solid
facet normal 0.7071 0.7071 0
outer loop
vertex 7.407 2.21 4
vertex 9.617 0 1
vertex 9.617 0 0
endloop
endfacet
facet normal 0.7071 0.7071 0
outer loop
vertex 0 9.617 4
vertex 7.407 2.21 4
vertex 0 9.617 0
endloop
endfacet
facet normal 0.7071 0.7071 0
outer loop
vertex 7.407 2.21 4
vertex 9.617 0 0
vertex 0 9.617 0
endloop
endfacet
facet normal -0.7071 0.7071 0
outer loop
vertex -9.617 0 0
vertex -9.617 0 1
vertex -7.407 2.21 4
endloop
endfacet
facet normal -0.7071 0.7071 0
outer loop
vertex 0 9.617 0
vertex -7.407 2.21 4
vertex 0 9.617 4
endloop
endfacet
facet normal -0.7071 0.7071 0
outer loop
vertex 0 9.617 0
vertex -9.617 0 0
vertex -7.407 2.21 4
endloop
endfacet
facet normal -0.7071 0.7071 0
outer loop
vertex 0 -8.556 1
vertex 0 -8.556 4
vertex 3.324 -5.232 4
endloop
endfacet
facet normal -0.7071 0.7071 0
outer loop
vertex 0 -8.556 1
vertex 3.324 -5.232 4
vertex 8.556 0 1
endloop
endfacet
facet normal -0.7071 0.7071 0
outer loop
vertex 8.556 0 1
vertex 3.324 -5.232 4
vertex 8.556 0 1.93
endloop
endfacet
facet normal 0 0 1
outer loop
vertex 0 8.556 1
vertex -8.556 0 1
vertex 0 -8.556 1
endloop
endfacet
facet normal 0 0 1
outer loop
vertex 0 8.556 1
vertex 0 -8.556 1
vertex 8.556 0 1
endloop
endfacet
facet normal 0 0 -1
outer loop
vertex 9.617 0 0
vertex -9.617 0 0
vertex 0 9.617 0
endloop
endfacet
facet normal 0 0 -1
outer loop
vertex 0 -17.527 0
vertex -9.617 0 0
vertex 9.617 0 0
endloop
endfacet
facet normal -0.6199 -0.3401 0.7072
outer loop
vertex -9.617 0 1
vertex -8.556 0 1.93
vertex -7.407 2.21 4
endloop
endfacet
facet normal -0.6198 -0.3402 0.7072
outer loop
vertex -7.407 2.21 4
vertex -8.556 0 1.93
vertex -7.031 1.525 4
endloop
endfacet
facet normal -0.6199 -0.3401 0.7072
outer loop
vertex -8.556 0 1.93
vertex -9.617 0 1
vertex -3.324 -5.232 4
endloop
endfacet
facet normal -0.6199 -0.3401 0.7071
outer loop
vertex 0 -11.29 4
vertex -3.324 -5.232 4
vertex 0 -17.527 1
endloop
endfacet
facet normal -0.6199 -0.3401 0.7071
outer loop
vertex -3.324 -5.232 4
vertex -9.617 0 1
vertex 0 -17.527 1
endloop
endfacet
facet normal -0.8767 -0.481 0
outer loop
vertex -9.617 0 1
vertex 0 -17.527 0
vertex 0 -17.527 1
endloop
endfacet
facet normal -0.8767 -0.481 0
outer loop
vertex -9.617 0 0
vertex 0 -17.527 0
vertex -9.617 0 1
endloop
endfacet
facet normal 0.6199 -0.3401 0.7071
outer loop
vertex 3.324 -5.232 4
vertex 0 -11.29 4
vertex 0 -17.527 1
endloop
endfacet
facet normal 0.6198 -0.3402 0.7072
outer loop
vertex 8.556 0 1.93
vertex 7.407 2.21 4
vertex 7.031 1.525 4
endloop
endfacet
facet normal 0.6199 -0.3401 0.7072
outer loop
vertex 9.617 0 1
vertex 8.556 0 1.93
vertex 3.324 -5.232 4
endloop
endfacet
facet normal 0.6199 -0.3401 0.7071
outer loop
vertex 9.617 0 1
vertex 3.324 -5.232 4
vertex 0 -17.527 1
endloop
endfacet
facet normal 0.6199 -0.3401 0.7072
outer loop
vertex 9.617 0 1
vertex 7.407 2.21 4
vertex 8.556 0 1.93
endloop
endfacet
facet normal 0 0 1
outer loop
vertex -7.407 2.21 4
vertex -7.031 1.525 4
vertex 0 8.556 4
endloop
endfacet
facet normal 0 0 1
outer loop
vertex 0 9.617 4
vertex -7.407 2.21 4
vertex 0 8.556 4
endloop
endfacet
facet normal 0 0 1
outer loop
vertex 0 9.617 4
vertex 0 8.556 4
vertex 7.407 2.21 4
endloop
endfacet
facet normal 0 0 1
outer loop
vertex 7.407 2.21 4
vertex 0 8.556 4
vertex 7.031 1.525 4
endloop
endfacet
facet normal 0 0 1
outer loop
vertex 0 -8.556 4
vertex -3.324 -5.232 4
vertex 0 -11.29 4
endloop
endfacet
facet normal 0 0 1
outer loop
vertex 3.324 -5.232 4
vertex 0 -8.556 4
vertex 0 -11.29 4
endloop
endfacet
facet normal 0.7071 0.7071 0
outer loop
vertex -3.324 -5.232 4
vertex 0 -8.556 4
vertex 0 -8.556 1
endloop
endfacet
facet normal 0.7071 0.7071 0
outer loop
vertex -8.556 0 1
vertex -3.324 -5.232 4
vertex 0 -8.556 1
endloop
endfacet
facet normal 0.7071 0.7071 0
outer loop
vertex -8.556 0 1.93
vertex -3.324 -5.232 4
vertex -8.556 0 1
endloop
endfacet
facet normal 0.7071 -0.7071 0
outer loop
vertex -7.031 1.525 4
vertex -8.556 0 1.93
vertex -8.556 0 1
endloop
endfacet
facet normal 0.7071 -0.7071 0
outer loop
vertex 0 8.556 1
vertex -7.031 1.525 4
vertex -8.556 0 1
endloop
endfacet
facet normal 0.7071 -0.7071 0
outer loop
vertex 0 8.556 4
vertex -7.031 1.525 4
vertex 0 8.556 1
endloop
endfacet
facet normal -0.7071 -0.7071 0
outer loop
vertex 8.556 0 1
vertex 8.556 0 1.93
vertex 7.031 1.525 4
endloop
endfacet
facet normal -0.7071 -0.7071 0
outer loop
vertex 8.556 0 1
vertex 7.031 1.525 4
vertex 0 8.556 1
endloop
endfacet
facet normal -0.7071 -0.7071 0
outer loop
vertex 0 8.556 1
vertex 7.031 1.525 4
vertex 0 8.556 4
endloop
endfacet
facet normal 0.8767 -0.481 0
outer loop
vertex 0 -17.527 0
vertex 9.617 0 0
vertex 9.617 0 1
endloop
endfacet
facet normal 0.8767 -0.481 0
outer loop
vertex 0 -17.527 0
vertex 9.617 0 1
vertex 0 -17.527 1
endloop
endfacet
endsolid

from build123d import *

# Parameters (mm, degrees)
F0_W        = 13.6
F0_H        = 13.6
F1_DEPTH    = 4
F2_W        = 12.1
F2_H        = 12.1
F3_DEPTH    = 3
F5_ANGLE    = 45
F7_DEPTH    = 4
F8_T1_DEPTH = 35.422011596
F8_T3_DEPTH = 35.422011596


# Not quite as in the source:
# - a fillet or chamfer that OpenCascade refuses, or shapes differently, is made with other operations: its cross-section is extruded or revolved along the edge and cut away or added


with BuildPart() as f1:
    # F0 (on Top) → F1 (new body)
    with BuildSketch(Plane.XY):
        Rectangle(F0_W, F0_H)
    extrude(amount=F1_DEPTH)

    # F2 (on face) → F3 (cut)
    with BuildSketch(Plane.XY.offset(4)):
        Rectangle(F2_W, F2_H)
    extrude(amount=-F3_DEPTH, mode=Mode.SUBTRACT)


with BuildPart() as f1_1:
    # F5: moved
    add(f1.part.rotate(Axis((0, 0, 16.5512096137), (0, 0, 1)), F5_ANGLE))

    # F6 (on face) → F7 (join)
    with BuildSketch(Plane(origin=(0, 0, 0), x_dir=(1, 0, 0), z_dir=(0, 0, -1))):
        Polygon((0, 9.6166522241), (9.6166522241, 0), (0, 17.527025193), (-9.6166522241, 0), align=None)
    extrude(amount=-F7_DEPTH)

    # F8: chamfer of 3 on 2 edges, made by hand

    # F8_s2 → F8_t1 (cut)
    with BuildSketch(Plane(origin=(5.9363165934, 10.8193546008, 0), x_dir=(0, 0, 1), z_dir=(-0.4810270984, -0.8767057263, 0))):
        Polygon((4, -5.4309740729), (1, -8.4309740729), (4, -8.4309740729), align=None)
    extrude(amount=F8_T1_DEPTH, mode=Mode.SUBTRACT)

    # F8_s4 → F8_t3 (cut)
    with BuildSketch(Plane(origin=(11.1026308657, -20.2353258031, 0), x_dir=(0, 0, 1), z_dir=(-0.4810270984, 0.8767057263, 0))):
        Polygon((1, -8.4309740729), (4, -5.4309740729), (4, -8.4309740729), align=None)
    extrude(amount=F8_T3_DEPTH, mode=Mode.SUBTRACT)


solid = f1_1.part
